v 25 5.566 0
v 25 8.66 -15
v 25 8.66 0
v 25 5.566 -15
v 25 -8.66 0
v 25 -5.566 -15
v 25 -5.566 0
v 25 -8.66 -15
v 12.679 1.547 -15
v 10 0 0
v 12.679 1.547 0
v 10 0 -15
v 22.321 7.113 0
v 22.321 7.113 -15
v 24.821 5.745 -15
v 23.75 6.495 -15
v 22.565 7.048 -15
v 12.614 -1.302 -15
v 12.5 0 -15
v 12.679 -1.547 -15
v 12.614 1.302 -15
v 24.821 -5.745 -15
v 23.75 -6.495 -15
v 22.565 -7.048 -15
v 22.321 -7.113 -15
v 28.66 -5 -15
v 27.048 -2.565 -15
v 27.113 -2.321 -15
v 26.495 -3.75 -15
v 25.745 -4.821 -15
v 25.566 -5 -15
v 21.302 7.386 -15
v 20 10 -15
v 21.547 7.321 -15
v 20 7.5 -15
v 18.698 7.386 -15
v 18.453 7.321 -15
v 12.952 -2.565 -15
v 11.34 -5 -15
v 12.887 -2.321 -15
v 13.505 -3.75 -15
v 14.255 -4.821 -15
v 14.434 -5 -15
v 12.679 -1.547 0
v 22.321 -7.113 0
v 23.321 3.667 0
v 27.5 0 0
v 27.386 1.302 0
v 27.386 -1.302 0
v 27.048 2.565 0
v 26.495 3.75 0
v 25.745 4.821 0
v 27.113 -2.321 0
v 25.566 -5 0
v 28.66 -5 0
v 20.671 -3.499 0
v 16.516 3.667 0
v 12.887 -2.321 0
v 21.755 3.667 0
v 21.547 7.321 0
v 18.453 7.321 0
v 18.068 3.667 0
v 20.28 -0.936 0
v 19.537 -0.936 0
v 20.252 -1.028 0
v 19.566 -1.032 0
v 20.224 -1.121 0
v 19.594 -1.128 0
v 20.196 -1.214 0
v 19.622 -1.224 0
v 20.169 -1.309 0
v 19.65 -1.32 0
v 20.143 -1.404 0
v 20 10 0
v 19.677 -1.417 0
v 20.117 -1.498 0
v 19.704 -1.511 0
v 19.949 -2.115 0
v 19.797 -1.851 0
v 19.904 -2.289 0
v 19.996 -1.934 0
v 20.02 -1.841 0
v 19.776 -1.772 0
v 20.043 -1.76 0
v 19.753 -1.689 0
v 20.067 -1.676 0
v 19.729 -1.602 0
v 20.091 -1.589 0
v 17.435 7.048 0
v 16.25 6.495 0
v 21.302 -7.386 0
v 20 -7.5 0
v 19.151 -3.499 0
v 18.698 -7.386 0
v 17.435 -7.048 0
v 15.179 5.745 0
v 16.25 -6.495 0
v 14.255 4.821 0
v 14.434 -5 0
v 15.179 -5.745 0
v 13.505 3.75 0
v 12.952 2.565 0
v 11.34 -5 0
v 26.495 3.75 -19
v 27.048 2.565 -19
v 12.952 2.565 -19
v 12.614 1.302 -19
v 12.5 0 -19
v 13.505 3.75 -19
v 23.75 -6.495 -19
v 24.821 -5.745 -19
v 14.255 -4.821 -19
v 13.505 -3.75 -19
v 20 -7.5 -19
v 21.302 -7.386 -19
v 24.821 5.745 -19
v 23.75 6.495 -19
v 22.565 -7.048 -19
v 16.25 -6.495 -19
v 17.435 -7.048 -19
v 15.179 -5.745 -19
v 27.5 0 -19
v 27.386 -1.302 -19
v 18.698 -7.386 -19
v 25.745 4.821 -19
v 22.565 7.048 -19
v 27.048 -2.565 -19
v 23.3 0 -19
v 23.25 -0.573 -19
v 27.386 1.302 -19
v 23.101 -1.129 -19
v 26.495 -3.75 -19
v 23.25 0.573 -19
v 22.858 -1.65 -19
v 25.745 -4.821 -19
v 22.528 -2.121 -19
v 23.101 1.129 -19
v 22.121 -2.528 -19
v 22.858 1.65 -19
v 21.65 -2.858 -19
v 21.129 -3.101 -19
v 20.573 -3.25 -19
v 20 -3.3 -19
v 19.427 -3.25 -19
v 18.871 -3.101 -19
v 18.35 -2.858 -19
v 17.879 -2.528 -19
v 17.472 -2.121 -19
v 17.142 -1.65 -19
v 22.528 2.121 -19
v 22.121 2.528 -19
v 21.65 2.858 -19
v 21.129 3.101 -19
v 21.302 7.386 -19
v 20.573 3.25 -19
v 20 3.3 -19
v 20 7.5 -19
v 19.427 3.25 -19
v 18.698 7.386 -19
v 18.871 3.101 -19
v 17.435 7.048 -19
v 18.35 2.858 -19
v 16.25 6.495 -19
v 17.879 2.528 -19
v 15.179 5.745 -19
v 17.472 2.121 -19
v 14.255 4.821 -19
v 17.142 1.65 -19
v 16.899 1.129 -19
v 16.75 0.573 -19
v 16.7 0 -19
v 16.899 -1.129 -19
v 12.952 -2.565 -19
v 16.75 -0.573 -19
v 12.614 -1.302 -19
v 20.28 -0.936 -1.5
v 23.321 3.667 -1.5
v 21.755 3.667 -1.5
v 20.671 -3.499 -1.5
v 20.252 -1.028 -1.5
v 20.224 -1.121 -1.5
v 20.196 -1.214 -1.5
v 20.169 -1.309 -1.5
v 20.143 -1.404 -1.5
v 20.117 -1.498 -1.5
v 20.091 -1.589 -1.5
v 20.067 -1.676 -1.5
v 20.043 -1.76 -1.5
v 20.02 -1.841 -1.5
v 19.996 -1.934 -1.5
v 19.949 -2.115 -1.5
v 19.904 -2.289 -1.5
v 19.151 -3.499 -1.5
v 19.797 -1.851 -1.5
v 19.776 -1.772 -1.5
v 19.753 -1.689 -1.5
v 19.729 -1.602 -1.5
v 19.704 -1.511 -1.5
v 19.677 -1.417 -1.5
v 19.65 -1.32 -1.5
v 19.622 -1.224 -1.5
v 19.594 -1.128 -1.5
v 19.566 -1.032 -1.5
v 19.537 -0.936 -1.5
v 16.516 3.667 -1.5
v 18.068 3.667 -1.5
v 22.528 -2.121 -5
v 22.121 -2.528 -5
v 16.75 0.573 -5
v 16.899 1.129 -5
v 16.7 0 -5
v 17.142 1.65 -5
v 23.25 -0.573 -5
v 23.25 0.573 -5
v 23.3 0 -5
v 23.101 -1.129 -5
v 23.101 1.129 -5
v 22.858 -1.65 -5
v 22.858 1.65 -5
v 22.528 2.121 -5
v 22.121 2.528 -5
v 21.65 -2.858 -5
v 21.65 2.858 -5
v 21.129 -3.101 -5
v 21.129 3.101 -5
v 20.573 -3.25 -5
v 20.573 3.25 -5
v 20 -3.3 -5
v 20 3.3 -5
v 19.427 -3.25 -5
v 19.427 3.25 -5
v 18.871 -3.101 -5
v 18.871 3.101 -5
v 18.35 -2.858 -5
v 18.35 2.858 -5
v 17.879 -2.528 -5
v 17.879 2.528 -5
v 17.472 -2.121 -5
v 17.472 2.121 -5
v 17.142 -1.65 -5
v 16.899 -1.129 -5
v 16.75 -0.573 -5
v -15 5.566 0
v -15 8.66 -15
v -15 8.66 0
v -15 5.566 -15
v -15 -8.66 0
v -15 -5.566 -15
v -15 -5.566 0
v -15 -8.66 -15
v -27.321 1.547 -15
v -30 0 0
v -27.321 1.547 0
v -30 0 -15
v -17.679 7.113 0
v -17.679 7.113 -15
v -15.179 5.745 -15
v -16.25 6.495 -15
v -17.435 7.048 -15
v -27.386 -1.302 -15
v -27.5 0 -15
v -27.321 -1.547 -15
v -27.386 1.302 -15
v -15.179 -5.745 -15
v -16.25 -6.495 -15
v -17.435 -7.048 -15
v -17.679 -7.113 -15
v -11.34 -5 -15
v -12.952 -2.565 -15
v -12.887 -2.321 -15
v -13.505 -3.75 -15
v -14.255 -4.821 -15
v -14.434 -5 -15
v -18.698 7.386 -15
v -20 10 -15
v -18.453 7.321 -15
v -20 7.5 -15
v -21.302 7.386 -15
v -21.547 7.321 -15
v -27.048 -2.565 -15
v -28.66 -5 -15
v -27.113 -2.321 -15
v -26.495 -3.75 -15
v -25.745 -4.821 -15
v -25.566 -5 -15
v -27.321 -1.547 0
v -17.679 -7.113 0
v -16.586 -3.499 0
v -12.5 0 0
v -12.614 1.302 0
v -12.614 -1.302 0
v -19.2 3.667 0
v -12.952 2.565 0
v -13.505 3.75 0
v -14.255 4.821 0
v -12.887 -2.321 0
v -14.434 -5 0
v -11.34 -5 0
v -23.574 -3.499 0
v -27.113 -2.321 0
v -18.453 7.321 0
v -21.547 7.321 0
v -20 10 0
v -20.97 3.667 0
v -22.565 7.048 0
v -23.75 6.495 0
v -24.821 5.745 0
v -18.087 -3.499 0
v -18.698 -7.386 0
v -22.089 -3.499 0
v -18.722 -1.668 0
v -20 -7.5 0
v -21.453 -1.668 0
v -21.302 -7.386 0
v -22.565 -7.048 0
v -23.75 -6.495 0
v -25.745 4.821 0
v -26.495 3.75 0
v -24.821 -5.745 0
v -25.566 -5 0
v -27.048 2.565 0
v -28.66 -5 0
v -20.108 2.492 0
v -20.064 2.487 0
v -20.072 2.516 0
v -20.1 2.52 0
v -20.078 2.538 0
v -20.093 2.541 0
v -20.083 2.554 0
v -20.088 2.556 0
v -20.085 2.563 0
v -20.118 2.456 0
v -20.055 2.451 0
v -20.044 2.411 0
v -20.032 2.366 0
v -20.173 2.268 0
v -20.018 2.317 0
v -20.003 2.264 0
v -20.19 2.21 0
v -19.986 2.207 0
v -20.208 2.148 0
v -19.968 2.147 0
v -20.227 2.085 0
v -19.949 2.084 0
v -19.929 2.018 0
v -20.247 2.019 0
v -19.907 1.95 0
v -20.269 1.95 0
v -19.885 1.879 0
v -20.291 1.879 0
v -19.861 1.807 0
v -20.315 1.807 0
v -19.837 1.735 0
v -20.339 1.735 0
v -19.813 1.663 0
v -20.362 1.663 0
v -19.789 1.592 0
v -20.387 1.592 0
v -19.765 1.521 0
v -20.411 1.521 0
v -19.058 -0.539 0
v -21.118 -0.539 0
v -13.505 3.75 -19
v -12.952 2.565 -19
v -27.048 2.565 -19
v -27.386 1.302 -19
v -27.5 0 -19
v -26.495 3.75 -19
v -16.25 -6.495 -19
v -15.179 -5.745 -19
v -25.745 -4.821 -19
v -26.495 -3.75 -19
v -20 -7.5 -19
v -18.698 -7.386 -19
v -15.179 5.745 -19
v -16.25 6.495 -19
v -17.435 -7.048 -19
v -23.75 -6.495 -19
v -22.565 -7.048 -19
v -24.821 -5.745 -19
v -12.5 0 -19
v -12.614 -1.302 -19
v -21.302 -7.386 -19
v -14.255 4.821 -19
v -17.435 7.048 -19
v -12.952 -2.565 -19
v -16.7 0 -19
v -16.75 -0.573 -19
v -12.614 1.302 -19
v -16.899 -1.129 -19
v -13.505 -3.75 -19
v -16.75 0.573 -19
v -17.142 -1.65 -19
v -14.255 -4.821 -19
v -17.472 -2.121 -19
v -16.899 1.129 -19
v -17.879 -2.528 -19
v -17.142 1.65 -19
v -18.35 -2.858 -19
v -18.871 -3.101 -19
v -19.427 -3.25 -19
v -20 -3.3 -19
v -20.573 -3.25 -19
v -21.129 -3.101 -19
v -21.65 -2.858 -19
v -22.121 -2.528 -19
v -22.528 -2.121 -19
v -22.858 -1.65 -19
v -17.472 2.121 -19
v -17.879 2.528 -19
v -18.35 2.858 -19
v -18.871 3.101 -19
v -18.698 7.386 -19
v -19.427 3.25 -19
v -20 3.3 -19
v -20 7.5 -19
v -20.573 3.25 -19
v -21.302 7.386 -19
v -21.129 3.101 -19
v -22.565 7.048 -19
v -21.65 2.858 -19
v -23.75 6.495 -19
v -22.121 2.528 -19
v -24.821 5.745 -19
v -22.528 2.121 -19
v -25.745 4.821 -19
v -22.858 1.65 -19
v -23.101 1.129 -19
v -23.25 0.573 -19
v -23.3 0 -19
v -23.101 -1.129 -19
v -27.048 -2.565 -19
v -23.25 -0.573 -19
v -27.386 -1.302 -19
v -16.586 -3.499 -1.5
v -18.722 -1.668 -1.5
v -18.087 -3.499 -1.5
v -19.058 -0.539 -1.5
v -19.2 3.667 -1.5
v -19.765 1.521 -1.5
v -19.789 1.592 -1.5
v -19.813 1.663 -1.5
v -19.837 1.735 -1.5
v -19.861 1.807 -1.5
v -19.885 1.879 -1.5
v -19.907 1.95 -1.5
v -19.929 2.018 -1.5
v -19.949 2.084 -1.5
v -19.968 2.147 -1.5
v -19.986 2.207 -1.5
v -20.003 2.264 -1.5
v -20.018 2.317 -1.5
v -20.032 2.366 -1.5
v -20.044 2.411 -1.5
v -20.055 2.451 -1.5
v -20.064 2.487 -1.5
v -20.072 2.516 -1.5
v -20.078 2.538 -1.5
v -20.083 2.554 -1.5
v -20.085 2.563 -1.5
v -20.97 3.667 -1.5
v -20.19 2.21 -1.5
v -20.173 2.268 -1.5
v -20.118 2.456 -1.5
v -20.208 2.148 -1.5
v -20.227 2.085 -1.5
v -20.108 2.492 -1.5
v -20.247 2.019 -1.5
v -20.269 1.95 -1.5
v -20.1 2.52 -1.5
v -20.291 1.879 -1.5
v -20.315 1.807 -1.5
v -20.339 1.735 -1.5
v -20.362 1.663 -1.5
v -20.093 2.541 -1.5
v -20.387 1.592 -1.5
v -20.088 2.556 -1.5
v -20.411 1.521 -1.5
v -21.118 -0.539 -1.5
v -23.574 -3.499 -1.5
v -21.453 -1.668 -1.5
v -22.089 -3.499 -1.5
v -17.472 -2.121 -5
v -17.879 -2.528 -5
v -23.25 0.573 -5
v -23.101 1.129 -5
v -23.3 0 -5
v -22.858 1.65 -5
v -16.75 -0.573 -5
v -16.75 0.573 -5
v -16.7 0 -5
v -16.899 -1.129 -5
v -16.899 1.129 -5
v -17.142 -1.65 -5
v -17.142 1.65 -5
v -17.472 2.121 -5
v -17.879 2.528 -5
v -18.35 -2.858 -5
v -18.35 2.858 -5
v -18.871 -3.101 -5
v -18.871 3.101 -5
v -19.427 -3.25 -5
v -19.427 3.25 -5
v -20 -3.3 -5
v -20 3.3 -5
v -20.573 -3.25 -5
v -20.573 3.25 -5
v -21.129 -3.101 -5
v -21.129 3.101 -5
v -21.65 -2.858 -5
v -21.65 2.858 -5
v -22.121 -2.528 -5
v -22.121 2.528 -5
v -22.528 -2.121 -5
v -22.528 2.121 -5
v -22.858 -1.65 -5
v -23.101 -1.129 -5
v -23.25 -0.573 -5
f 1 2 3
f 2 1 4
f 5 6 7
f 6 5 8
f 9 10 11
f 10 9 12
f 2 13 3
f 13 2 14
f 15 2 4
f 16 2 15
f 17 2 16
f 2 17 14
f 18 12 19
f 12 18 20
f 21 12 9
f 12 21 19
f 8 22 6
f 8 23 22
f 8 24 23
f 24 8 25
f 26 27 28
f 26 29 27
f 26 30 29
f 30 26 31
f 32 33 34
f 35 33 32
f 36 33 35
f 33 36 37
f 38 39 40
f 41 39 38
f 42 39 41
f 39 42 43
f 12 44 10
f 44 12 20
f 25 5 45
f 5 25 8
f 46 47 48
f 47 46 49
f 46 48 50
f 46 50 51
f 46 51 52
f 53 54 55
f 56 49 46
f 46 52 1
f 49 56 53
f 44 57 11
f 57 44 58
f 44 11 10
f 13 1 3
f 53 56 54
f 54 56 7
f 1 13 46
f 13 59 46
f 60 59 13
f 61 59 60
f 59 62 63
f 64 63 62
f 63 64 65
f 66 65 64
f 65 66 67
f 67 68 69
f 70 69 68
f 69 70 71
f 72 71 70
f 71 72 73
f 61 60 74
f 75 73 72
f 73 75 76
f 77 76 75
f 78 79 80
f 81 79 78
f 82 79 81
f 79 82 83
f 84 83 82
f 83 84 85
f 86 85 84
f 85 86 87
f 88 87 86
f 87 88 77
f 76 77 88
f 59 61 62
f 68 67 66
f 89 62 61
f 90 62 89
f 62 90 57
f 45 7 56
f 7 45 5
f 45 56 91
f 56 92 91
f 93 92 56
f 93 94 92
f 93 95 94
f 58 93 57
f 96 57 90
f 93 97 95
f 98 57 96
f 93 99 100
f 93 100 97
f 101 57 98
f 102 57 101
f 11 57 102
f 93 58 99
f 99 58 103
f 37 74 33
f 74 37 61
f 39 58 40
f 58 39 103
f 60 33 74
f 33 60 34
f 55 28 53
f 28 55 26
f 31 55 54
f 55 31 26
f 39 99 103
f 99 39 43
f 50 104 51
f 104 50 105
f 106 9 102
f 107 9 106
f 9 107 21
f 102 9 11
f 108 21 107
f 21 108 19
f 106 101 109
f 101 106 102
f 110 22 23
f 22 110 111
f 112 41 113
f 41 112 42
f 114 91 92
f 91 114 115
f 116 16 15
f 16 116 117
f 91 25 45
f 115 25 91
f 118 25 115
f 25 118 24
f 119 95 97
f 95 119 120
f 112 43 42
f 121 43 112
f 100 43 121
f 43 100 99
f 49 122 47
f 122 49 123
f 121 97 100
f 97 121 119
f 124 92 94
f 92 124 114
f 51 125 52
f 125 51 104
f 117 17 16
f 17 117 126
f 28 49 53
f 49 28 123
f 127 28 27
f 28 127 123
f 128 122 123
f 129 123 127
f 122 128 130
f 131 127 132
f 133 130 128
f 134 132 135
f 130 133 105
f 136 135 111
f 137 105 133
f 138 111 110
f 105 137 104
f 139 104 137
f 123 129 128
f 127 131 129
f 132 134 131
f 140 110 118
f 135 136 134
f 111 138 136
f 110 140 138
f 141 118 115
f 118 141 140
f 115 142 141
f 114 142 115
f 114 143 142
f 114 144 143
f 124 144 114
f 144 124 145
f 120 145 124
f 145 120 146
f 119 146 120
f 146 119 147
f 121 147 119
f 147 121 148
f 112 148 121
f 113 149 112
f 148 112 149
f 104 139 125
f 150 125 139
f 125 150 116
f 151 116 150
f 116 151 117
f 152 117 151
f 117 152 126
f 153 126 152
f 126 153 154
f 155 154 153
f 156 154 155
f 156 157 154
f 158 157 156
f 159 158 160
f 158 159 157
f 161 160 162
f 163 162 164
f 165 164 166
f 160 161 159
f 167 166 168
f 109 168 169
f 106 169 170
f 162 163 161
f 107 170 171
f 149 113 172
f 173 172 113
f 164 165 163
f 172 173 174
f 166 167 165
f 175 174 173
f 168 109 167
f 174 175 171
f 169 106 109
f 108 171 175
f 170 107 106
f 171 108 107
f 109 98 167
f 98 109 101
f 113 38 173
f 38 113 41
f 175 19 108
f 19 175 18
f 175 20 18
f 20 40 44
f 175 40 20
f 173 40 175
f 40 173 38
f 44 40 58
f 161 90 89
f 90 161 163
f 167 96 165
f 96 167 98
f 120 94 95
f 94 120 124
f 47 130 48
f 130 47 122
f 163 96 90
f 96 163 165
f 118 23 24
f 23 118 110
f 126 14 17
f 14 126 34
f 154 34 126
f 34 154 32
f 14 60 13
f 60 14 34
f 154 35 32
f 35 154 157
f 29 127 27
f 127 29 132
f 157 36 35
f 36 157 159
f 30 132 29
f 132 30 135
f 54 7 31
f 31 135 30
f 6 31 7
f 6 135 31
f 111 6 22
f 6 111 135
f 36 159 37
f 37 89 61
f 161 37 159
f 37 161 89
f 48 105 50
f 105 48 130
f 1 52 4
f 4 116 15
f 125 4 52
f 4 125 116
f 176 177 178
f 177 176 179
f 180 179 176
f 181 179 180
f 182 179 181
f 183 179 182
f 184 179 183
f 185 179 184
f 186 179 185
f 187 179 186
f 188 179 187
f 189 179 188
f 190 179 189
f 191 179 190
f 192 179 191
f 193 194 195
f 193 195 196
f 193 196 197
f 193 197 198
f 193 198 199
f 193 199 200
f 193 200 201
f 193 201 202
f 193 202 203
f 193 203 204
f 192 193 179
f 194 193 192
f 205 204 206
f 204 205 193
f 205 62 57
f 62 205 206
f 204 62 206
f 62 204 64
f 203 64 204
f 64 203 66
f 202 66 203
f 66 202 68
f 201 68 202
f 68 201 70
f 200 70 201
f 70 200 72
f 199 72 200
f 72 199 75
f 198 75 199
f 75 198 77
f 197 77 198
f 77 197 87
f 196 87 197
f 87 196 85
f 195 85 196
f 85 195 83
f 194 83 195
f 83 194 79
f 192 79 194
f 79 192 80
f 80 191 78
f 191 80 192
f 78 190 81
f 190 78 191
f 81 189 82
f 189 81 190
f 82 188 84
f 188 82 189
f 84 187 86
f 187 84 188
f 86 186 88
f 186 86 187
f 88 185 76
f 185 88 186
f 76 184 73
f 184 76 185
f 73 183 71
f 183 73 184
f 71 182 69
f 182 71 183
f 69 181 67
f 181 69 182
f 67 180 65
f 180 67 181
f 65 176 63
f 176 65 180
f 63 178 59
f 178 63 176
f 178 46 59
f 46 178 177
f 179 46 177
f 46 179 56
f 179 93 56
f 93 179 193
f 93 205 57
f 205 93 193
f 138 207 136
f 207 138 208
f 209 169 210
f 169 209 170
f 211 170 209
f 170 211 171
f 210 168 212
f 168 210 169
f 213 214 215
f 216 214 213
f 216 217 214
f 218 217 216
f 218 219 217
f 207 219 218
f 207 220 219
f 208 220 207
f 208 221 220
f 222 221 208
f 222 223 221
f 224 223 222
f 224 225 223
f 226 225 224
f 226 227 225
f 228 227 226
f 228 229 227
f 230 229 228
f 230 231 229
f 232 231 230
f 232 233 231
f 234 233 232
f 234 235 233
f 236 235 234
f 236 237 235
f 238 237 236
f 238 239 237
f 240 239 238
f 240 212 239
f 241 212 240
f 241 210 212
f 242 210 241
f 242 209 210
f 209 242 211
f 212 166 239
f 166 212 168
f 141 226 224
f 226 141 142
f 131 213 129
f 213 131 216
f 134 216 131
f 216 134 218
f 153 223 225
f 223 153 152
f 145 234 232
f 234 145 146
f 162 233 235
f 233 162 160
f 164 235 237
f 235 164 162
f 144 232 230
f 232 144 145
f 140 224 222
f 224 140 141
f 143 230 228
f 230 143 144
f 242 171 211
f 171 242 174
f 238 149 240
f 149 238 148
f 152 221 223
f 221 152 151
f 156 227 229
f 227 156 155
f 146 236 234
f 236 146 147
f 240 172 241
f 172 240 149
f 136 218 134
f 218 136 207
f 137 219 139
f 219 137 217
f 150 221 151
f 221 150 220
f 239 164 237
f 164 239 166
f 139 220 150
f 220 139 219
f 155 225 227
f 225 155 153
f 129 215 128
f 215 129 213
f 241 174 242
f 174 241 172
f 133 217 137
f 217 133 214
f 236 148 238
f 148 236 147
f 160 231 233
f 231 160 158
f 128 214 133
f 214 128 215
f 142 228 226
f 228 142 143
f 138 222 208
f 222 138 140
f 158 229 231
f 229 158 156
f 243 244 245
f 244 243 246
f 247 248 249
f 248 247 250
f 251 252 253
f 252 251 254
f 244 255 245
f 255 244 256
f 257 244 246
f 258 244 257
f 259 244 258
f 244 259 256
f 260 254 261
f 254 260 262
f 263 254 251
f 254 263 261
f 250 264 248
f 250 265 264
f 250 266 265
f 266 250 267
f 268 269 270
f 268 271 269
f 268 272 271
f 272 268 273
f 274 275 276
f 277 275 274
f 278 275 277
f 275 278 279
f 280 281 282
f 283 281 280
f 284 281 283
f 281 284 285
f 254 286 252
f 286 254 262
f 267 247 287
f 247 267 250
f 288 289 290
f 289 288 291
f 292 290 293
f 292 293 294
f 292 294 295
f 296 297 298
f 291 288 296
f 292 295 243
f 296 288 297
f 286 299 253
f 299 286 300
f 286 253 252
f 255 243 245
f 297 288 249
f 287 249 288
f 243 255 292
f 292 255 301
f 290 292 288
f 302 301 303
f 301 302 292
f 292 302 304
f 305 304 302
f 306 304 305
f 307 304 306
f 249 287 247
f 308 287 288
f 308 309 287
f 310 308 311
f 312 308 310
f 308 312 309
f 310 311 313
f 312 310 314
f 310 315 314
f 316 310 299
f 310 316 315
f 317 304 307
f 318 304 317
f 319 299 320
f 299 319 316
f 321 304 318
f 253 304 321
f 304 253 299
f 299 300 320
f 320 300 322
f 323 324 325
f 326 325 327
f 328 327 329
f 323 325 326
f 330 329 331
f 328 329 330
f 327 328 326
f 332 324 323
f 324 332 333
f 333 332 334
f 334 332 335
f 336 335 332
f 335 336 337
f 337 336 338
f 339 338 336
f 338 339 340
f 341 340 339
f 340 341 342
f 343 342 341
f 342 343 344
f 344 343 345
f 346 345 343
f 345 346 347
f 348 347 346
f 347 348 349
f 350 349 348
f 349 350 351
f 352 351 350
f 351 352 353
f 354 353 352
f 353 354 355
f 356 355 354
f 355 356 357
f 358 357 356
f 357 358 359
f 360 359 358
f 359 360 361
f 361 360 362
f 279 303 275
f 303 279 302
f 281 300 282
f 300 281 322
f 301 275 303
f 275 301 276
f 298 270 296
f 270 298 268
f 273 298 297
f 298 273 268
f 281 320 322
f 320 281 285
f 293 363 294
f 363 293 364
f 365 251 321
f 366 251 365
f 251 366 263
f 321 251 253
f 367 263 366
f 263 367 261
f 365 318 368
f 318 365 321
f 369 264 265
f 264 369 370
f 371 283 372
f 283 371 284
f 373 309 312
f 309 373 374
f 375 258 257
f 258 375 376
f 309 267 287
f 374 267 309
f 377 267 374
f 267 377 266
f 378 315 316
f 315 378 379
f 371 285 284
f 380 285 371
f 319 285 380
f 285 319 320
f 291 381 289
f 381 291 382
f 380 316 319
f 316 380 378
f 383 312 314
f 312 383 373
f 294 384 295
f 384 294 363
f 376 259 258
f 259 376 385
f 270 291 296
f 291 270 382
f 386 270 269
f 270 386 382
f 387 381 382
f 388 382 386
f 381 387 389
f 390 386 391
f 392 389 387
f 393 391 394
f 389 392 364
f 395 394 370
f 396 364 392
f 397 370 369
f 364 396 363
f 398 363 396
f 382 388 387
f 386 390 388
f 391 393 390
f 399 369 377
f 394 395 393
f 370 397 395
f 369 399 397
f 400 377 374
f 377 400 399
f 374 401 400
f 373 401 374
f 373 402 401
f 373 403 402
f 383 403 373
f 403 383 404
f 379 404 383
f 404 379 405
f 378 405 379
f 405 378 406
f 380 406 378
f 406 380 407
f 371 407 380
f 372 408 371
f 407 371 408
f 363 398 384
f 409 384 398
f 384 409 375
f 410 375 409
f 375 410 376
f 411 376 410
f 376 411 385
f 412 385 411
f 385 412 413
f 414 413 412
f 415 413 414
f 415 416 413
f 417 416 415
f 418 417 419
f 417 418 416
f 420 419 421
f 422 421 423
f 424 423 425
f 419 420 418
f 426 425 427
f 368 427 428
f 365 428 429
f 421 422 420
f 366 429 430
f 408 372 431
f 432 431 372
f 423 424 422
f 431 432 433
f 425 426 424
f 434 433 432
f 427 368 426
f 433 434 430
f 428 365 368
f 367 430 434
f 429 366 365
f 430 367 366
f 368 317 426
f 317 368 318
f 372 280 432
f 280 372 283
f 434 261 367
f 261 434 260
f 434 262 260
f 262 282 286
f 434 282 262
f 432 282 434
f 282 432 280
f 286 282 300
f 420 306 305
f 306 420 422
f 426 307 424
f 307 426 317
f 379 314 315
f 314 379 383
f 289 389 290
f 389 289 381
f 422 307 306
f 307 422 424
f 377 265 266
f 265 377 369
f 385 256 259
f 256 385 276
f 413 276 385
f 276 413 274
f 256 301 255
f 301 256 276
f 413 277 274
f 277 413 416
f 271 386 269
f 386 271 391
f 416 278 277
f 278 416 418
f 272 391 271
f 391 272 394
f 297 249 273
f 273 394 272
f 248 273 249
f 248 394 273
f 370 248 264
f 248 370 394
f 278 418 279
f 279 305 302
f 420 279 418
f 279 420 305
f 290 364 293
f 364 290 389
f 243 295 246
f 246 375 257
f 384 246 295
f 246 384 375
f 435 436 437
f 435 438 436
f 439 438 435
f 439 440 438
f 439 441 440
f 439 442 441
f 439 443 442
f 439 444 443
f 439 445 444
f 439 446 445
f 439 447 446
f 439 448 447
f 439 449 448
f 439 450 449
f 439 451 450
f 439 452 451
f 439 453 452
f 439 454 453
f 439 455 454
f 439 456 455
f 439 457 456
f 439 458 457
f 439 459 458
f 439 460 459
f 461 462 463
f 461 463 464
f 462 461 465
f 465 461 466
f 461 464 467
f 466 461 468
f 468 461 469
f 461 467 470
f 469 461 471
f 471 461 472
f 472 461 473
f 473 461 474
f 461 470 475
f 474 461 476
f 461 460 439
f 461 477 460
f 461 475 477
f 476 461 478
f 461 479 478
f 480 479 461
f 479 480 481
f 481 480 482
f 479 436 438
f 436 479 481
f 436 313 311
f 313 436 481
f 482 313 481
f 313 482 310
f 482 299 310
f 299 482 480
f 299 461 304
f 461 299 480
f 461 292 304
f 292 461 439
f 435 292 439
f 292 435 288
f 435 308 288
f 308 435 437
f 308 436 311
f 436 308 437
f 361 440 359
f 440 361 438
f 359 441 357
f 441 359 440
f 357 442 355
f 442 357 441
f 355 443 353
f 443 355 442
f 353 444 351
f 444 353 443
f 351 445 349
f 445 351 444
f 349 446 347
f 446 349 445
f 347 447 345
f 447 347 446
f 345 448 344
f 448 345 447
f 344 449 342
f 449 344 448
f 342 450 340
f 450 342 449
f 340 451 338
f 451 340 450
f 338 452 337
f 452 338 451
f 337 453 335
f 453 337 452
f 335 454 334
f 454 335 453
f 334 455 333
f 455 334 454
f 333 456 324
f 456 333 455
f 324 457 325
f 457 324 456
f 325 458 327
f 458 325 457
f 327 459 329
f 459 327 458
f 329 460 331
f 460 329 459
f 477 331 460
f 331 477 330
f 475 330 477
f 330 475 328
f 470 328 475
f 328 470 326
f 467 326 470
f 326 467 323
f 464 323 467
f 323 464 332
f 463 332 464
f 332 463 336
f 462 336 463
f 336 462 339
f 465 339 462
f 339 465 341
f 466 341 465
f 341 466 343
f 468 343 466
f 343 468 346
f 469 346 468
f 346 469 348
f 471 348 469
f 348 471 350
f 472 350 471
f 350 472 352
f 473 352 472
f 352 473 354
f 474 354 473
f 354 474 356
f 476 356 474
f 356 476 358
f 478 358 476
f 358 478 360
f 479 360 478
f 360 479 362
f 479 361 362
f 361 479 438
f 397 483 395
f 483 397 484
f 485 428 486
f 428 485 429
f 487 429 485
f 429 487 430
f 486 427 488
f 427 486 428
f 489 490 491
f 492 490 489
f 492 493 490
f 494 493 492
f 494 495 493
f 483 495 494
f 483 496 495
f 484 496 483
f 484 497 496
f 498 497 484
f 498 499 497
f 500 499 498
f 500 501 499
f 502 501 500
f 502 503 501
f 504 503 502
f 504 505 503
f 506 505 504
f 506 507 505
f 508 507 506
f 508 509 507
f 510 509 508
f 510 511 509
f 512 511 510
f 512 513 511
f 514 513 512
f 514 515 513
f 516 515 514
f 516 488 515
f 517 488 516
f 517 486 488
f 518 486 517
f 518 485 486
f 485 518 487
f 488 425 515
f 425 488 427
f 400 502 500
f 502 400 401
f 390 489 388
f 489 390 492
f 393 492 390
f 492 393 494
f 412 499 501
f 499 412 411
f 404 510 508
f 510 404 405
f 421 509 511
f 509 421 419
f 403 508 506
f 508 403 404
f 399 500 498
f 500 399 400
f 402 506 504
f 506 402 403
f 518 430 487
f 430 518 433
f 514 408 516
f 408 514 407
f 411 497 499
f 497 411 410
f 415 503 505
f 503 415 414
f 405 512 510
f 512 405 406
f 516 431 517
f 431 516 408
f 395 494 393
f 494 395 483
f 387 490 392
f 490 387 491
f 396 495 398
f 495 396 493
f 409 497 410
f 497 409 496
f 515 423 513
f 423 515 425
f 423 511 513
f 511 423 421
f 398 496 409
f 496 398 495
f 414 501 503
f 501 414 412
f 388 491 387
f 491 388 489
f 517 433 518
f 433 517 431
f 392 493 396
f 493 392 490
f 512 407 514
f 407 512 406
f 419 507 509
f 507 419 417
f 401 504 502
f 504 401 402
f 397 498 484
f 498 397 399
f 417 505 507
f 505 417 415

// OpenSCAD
$fn=36;

Knob_diameter=20;
Knob_heigth=15;
Knob_neck_diameter=15;
Knob_neck_heigth=4;
Knob_style=1;           //[0,1]
Knob_grips_number=2;
Knob_hole_diameter=6.6;
Knob_hole_heigth=15;    //the diameter is based on potentiometer shaft parameters



module Knob(Kd,Kh,Knd,Knh,T,Khd,Khh)
   {
   rotate([0,180,0])
   difference()
      {
      union()
         {
         cylinder(d=Kd,h=Kh,$fn=Knob_grips_number);
         
         if(Knob_style==1)
            rotate([0,0,360/Knob_grips_number/2])
               cylinder(d=Kd,h=Kh,$fn=Knob_grips_number);
         
         cylinder(d=Knd,h=Kh+Knh);
         }
      translate([0,0,-0.5])
      linear_extrude(height=2)
         text(str(T),valign="center",halign="center",size=Knd/2,font="Arial:style=Bold");

      translate([0,0,Kh+Knh-Khh+1])
         cylinder(d=Khd,h=Khh+1);
      }
   }

//--------------------------------------------------------------------------------------------------------------------------------------------------
//--------------------------------------------------------------------------------------------------------------------------------------------------
//--------------------------------------------------------------------------------------------------------------------------------------------------

translate([Knob_diameter,0,0])
rotate([0,0,0])
Knob(Knob_diameter,Knob_heigth,Knob_neck_diameter,Knob_neck_heigth,"V",Knob_hole_diameter,Knob_hole_heigth);
translate([-Knob_diameter,0,0])
rotate([0,0,0])
Knob(Knob_diameter,Knob_heigth,Knob_neck_diameter,Knob_neck_heigth,"A",Knob_hole_diameter,Knob_hole_heigth);
